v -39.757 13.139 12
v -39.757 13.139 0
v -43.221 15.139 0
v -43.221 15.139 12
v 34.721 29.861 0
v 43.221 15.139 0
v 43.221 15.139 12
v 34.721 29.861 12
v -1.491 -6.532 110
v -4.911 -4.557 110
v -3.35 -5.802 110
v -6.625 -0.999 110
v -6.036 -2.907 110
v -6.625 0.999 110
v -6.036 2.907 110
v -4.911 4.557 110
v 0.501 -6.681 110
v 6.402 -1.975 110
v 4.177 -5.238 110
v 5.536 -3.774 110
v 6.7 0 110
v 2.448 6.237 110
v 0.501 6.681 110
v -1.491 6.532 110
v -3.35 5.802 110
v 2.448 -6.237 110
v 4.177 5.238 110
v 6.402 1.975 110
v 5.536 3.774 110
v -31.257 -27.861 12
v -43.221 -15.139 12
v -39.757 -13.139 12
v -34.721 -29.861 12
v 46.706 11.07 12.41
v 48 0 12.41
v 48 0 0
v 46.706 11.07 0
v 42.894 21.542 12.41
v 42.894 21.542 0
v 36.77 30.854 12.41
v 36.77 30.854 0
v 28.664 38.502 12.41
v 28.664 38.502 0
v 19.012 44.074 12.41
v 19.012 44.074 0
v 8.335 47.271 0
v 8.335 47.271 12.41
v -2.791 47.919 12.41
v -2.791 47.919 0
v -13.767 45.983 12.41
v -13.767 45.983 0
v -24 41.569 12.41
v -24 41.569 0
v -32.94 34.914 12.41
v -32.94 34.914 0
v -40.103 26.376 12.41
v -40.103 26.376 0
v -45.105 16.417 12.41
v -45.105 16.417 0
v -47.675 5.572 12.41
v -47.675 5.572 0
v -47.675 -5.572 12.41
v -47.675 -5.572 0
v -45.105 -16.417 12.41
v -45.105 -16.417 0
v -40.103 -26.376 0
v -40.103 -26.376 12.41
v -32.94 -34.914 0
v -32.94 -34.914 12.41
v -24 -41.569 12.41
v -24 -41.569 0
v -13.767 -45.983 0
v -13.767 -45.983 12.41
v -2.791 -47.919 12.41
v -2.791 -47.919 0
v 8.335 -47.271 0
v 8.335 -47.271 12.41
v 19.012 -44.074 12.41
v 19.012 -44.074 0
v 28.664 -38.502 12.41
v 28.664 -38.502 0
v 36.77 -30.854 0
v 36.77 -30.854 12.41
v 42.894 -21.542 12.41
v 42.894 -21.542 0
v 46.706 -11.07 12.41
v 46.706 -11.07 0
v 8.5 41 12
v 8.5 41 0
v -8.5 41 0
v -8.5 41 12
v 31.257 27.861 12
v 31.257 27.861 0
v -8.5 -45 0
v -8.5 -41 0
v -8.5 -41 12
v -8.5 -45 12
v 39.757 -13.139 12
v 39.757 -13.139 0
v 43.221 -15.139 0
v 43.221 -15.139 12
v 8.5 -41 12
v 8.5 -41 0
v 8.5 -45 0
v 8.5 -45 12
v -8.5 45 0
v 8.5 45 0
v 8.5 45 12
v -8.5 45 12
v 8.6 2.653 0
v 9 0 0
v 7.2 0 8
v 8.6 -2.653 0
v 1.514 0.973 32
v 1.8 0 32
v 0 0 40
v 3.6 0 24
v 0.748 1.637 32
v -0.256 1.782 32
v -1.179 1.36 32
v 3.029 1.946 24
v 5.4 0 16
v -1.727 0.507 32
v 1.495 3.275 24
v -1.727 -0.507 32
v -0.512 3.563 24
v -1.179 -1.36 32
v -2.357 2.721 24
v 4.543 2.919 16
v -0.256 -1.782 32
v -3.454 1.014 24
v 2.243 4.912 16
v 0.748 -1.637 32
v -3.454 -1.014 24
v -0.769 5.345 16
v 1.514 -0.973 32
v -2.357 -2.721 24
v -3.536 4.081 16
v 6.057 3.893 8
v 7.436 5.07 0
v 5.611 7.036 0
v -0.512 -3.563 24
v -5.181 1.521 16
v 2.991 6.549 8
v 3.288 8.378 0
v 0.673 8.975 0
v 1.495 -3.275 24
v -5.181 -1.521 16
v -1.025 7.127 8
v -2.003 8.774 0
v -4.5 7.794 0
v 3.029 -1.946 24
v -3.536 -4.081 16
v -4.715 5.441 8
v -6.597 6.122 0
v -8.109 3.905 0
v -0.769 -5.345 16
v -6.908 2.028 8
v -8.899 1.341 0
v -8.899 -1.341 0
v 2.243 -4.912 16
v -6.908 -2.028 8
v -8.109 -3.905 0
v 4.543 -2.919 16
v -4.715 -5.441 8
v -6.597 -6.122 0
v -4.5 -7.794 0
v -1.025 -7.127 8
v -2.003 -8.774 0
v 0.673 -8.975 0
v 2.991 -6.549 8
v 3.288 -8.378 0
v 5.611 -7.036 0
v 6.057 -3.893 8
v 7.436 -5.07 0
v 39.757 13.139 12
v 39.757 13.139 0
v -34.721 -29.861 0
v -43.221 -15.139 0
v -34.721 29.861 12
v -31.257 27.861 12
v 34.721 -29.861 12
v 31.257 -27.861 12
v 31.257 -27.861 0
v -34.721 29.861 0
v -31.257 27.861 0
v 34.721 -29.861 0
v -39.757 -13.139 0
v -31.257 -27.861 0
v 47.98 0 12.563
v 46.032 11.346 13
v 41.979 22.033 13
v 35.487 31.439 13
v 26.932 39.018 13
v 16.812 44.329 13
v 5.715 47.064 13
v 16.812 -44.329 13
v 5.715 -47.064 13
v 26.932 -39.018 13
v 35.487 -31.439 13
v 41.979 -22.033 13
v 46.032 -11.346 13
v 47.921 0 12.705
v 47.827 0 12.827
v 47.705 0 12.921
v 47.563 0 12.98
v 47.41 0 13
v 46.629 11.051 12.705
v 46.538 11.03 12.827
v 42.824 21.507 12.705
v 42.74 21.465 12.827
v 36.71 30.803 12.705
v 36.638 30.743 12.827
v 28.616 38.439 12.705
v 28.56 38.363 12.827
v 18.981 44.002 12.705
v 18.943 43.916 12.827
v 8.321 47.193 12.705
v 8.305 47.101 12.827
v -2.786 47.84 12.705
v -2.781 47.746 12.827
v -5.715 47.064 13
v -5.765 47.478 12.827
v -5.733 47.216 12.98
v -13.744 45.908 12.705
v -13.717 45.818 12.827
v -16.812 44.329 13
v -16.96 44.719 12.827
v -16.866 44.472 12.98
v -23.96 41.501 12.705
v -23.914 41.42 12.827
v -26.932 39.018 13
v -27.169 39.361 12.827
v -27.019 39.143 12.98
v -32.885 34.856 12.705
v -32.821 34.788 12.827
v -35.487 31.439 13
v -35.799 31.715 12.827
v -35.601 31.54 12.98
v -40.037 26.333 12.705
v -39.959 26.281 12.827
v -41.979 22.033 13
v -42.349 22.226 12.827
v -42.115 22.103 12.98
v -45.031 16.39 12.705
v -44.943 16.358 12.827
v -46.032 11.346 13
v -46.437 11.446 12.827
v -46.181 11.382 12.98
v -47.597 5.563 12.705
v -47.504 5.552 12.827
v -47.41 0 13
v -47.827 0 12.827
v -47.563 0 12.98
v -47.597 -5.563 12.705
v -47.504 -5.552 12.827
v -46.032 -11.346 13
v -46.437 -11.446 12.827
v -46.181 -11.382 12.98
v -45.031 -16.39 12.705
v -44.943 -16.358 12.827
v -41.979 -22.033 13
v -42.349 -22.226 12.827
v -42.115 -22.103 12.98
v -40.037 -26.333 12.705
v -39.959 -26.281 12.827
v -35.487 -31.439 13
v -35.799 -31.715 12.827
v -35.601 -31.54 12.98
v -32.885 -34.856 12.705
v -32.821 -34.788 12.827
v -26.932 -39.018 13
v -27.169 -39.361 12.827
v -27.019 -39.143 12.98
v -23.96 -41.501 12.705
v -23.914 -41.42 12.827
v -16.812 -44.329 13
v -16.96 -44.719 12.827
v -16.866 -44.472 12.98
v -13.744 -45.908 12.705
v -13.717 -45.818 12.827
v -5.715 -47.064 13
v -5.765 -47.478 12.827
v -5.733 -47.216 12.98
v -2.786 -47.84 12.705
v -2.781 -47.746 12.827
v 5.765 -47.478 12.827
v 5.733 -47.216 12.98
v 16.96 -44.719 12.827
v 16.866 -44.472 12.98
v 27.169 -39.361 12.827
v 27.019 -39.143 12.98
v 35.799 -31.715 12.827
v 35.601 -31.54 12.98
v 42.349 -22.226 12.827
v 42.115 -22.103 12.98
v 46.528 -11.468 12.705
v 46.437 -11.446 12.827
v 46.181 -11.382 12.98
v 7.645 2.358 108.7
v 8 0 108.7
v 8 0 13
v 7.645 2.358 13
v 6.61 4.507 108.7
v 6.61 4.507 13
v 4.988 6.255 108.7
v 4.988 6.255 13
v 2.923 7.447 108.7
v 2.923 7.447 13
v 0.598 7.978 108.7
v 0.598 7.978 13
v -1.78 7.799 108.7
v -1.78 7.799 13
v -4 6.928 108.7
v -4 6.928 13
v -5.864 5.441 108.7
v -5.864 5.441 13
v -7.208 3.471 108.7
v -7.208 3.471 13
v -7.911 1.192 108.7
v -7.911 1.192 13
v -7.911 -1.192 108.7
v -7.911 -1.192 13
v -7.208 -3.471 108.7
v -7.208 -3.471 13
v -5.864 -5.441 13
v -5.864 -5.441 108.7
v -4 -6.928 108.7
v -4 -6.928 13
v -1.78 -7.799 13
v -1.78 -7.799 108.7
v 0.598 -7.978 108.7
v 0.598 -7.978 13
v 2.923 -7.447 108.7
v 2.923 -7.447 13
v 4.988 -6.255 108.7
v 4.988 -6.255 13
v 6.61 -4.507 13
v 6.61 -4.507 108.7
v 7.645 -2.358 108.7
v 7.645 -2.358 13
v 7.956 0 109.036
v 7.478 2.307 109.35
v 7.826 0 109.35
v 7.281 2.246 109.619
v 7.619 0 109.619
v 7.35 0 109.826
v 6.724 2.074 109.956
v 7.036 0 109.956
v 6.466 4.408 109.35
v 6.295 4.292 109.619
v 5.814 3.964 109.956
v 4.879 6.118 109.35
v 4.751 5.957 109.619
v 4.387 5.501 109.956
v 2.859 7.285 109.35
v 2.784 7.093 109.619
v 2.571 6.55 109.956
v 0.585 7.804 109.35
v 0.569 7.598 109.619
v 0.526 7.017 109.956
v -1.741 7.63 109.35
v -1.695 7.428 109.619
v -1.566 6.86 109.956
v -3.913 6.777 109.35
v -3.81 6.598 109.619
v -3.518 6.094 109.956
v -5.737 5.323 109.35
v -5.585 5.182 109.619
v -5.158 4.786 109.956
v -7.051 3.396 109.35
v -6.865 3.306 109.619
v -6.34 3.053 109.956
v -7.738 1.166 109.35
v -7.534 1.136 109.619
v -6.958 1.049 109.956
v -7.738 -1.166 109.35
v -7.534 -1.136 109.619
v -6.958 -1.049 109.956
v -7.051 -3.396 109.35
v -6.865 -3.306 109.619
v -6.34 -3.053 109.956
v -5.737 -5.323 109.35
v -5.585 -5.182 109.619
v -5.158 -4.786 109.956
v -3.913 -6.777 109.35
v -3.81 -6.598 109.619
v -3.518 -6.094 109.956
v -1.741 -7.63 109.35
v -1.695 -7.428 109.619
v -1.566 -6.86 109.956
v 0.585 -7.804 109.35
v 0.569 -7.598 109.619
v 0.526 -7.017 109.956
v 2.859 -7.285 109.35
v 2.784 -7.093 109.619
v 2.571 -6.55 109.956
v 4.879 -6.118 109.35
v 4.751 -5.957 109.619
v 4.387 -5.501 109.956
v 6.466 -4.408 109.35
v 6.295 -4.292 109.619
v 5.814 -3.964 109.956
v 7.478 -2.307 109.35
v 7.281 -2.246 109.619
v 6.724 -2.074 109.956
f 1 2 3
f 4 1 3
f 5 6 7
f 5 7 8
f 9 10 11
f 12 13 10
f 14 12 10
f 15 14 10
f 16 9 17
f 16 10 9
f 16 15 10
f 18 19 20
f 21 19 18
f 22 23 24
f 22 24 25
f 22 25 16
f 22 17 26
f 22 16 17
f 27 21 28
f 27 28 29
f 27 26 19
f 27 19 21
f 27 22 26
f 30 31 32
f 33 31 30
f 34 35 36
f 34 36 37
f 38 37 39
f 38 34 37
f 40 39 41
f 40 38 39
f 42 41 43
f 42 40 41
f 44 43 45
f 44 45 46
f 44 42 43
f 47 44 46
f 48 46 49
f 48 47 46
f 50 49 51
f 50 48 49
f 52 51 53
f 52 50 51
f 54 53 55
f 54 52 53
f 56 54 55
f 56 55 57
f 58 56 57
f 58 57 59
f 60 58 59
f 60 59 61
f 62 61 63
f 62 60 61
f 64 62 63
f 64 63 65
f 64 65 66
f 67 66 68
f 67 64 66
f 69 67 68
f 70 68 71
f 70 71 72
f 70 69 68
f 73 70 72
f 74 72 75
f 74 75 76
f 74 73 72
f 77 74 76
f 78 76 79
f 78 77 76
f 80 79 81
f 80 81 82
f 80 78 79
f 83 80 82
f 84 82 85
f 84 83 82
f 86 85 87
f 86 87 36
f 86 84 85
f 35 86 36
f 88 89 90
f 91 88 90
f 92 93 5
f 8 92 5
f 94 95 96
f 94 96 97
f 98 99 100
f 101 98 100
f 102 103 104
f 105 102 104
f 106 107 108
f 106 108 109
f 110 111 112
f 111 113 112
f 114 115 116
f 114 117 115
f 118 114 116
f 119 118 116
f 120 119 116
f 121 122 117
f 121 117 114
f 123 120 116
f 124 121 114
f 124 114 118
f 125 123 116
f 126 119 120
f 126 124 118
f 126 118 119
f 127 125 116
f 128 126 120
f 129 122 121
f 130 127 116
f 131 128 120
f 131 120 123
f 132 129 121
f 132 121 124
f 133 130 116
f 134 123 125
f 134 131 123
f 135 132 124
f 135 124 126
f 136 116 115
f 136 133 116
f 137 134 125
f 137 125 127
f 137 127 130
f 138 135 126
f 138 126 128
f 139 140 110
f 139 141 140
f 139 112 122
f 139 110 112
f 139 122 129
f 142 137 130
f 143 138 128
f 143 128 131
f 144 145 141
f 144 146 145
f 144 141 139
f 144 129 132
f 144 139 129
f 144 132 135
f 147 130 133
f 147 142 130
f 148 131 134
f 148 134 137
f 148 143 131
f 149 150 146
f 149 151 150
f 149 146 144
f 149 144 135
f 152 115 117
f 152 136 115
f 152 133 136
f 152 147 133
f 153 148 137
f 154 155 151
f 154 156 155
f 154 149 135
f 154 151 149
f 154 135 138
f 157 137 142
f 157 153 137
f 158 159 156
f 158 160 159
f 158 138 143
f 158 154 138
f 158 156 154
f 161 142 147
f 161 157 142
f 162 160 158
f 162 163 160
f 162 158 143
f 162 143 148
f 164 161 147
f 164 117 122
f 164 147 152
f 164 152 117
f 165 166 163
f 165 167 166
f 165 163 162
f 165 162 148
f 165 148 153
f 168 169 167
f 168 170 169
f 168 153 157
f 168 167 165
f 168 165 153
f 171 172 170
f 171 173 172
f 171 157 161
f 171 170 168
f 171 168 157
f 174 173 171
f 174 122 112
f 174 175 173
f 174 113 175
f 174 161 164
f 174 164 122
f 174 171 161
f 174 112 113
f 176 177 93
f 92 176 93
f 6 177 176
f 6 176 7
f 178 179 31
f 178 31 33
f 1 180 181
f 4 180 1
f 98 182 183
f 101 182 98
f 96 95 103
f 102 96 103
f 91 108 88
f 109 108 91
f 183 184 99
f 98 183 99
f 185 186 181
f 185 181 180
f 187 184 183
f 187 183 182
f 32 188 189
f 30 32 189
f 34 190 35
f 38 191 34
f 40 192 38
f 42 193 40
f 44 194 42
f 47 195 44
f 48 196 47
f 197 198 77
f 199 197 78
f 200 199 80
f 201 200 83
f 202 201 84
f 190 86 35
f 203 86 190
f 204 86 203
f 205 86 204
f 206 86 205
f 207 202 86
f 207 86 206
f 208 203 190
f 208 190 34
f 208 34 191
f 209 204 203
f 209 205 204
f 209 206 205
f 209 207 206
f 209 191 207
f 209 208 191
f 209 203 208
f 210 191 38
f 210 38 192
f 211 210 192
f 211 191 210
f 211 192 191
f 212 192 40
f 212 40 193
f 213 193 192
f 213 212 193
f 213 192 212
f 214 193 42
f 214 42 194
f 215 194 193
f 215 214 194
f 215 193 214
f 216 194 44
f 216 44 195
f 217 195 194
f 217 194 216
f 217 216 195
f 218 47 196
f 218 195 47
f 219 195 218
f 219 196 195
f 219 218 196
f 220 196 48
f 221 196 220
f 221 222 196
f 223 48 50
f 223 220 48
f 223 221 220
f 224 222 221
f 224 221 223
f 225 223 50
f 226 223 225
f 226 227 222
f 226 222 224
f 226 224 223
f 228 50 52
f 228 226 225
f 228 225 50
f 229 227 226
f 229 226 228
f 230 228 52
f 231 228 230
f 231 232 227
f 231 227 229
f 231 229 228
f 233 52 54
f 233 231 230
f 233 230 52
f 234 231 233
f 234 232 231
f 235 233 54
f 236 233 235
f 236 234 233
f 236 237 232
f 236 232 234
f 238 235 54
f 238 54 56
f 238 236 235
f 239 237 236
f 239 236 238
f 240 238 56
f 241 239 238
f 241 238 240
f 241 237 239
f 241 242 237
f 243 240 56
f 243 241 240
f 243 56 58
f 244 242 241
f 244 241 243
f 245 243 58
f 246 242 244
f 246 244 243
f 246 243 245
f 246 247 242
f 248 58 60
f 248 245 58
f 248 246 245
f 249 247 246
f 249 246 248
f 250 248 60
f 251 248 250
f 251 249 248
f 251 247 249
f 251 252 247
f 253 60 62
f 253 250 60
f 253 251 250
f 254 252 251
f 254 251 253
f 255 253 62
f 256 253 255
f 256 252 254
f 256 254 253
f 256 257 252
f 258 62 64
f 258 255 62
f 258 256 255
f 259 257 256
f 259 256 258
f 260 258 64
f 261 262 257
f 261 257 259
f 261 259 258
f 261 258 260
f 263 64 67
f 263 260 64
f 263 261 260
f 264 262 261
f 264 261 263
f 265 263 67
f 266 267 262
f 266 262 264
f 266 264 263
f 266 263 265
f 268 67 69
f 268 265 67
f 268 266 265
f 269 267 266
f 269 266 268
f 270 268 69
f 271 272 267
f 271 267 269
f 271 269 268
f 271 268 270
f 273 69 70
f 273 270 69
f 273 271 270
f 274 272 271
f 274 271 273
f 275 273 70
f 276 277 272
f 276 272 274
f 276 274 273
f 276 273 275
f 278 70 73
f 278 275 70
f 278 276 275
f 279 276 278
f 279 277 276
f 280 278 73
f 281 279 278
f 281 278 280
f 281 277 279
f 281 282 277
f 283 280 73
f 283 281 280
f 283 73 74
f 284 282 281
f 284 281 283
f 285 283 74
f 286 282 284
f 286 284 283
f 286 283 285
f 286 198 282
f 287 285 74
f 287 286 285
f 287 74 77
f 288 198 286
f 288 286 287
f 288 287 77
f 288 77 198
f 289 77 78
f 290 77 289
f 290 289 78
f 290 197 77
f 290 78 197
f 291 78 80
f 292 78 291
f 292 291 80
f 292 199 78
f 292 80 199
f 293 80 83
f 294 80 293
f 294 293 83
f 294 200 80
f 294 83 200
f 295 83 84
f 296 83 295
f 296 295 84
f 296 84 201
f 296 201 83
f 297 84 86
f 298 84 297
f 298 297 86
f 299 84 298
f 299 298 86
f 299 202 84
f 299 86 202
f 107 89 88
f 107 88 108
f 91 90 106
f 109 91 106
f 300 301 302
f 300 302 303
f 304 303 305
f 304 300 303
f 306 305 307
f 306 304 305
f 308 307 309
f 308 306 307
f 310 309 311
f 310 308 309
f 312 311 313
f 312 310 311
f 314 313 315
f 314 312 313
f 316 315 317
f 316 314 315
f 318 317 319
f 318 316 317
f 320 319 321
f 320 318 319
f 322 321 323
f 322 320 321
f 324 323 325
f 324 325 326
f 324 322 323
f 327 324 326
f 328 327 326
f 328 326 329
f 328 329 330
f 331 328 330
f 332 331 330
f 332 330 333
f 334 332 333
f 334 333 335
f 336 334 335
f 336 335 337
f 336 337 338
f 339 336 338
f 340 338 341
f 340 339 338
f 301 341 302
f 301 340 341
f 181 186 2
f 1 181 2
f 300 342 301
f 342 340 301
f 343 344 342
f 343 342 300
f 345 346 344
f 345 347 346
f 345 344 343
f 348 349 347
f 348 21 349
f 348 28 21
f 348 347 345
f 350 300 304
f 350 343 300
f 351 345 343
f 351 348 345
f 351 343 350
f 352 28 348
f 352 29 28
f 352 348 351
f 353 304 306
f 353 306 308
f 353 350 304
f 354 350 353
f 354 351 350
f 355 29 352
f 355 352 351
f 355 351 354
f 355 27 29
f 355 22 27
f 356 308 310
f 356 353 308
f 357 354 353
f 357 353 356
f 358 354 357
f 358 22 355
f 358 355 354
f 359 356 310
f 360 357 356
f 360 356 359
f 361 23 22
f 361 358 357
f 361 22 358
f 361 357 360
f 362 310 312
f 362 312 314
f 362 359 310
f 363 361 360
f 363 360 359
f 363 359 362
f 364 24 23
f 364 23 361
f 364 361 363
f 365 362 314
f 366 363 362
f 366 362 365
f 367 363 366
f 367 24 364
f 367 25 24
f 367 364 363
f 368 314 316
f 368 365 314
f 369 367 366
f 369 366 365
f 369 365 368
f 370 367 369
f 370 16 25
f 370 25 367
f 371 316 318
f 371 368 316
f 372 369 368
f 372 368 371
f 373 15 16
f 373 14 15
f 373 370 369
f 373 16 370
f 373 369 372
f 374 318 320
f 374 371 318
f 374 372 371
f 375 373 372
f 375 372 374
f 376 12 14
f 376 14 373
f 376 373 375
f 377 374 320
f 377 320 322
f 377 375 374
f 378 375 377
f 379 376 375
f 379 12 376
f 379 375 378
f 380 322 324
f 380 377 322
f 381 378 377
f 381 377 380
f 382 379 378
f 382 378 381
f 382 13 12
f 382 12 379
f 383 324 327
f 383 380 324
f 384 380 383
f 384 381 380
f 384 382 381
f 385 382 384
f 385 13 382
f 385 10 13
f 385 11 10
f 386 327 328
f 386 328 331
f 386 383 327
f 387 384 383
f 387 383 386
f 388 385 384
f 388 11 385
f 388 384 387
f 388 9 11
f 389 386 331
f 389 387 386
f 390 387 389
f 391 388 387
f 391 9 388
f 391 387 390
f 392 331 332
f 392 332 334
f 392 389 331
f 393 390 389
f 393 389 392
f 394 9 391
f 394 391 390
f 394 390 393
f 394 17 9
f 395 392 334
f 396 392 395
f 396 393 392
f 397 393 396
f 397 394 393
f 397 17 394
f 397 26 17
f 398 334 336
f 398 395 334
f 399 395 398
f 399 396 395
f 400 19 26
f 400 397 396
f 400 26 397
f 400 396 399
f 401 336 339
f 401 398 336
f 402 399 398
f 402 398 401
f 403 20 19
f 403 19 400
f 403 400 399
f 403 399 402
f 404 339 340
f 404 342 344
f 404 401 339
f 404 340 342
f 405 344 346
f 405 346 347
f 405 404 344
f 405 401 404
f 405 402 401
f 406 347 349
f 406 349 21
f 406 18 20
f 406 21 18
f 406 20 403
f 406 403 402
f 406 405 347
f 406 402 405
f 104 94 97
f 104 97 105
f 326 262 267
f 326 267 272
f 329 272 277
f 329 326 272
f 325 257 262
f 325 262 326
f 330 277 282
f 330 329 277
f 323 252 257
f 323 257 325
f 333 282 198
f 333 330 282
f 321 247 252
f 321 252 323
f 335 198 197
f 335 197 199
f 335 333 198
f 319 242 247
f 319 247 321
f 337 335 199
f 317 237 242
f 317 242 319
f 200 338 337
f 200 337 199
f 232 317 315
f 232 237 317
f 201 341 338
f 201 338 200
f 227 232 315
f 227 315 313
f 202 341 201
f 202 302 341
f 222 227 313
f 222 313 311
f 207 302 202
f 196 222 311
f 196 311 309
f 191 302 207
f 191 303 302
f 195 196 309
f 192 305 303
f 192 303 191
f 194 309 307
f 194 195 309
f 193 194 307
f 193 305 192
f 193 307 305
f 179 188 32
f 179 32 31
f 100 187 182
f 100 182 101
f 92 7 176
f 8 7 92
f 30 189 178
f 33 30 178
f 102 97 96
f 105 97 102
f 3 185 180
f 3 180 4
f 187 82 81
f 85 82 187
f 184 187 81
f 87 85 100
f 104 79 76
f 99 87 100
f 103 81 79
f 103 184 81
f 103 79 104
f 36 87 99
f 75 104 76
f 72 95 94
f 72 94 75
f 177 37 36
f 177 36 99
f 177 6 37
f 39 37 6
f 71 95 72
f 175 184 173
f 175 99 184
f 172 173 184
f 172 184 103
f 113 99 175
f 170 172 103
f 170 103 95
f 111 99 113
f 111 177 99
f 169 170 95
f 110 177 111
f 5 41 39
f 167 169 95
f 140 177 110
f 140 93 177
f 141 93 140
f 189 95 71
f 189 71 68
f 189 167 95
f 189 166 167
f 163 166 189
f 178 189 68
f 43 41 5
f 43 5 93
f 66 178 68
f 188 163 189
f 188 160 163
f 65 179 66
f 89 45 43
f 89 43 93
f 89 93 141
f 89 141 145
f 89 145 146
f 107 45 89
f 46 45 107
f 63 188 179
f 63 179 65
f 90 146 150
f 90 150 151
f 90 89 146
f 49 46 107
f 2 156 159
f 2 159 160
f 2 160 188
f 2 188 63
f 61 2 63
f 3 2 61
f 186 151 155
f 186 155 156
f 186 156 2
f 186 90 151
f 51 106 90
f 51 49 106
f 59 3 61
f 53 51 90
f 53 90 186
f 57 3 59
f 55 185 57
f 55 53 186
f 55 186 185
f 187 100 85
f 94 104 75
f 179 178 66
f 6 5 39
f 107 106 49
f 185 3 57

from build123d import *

# Parameters (mm, degrees)
F2_W            = 17
F2_H            = 4
F3_DEPTH        = 12
F3_COPIES_COUNT = 6
F4_R            = 0.59
F5_R            = 1.3


# Not quite as in the source:
# - a pattern or mirror of a feature is missing from the dataset's text; its kind, count and spacing are read off the source's solid


with BuildPart() as f1:
    # F0 (on Front) → F1 (revolve)
    with BuildSketch(Plane.XZ):
        Polygon((0, 110), (0, 40), (9, 0), (48, 0), (48, 13), (8, 13), (8, 110), align=None)
    revolve(axis=Axis((0, 0, 75), (0, 0, 1)))

    # F2 (on face) → F3 (cut)
    with BuildSketch(Plane(origin=(0, 0, 0), x_dir=(1, 0, 0), z_dir=(0, 0, -1))):
        with Locations((0, 43)):
            Rectangle(F2_W, F2_H)
    f3 = extrude(amount=-F3_DEPTH, mode=Mode.SUBTRACT)

    # F3_copies: F3 ×6 about axis
    f3_copies_axis = Axis((0, 0, 0), (0, 0, 1))
    for i in range(1, F3_COPIES_COUNT):
        add(f3.rotate(f3_copies_axis, i * 360 / F3_COPIES_COUNT), mode=Mode.SUBTRACT)

    # F4
    f4_edges = [f1.edges().sort_by_distance(p)[0] for p in [
        (-48, 0, 13),
    ]]
    fillet(f4_edges, radius=F4_R)

    # F5
    f5_edges = [f1.edges().sort_by_distance(p)[0] for p in [
        (-8, 0, 110),
    ]]
    fillet(f5_edges, radius=F5_R)


solid = f1.part
